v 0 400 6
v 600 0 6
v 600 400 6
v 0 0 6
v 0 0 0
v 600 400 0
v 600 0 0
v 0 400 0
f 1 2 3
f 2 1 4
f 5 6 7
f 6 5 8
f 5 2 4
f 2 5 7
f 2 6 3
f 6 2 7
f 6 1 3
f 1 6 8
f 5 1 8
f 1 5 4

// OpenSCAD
$fn = 64;

sheet_x = 600;
sheet_y = 400;
sheet_thickness = 6;

color([0.78, 0.67, 0.50])
cube([sheet_x, sheet_y, sheet_thickness], center=false);
